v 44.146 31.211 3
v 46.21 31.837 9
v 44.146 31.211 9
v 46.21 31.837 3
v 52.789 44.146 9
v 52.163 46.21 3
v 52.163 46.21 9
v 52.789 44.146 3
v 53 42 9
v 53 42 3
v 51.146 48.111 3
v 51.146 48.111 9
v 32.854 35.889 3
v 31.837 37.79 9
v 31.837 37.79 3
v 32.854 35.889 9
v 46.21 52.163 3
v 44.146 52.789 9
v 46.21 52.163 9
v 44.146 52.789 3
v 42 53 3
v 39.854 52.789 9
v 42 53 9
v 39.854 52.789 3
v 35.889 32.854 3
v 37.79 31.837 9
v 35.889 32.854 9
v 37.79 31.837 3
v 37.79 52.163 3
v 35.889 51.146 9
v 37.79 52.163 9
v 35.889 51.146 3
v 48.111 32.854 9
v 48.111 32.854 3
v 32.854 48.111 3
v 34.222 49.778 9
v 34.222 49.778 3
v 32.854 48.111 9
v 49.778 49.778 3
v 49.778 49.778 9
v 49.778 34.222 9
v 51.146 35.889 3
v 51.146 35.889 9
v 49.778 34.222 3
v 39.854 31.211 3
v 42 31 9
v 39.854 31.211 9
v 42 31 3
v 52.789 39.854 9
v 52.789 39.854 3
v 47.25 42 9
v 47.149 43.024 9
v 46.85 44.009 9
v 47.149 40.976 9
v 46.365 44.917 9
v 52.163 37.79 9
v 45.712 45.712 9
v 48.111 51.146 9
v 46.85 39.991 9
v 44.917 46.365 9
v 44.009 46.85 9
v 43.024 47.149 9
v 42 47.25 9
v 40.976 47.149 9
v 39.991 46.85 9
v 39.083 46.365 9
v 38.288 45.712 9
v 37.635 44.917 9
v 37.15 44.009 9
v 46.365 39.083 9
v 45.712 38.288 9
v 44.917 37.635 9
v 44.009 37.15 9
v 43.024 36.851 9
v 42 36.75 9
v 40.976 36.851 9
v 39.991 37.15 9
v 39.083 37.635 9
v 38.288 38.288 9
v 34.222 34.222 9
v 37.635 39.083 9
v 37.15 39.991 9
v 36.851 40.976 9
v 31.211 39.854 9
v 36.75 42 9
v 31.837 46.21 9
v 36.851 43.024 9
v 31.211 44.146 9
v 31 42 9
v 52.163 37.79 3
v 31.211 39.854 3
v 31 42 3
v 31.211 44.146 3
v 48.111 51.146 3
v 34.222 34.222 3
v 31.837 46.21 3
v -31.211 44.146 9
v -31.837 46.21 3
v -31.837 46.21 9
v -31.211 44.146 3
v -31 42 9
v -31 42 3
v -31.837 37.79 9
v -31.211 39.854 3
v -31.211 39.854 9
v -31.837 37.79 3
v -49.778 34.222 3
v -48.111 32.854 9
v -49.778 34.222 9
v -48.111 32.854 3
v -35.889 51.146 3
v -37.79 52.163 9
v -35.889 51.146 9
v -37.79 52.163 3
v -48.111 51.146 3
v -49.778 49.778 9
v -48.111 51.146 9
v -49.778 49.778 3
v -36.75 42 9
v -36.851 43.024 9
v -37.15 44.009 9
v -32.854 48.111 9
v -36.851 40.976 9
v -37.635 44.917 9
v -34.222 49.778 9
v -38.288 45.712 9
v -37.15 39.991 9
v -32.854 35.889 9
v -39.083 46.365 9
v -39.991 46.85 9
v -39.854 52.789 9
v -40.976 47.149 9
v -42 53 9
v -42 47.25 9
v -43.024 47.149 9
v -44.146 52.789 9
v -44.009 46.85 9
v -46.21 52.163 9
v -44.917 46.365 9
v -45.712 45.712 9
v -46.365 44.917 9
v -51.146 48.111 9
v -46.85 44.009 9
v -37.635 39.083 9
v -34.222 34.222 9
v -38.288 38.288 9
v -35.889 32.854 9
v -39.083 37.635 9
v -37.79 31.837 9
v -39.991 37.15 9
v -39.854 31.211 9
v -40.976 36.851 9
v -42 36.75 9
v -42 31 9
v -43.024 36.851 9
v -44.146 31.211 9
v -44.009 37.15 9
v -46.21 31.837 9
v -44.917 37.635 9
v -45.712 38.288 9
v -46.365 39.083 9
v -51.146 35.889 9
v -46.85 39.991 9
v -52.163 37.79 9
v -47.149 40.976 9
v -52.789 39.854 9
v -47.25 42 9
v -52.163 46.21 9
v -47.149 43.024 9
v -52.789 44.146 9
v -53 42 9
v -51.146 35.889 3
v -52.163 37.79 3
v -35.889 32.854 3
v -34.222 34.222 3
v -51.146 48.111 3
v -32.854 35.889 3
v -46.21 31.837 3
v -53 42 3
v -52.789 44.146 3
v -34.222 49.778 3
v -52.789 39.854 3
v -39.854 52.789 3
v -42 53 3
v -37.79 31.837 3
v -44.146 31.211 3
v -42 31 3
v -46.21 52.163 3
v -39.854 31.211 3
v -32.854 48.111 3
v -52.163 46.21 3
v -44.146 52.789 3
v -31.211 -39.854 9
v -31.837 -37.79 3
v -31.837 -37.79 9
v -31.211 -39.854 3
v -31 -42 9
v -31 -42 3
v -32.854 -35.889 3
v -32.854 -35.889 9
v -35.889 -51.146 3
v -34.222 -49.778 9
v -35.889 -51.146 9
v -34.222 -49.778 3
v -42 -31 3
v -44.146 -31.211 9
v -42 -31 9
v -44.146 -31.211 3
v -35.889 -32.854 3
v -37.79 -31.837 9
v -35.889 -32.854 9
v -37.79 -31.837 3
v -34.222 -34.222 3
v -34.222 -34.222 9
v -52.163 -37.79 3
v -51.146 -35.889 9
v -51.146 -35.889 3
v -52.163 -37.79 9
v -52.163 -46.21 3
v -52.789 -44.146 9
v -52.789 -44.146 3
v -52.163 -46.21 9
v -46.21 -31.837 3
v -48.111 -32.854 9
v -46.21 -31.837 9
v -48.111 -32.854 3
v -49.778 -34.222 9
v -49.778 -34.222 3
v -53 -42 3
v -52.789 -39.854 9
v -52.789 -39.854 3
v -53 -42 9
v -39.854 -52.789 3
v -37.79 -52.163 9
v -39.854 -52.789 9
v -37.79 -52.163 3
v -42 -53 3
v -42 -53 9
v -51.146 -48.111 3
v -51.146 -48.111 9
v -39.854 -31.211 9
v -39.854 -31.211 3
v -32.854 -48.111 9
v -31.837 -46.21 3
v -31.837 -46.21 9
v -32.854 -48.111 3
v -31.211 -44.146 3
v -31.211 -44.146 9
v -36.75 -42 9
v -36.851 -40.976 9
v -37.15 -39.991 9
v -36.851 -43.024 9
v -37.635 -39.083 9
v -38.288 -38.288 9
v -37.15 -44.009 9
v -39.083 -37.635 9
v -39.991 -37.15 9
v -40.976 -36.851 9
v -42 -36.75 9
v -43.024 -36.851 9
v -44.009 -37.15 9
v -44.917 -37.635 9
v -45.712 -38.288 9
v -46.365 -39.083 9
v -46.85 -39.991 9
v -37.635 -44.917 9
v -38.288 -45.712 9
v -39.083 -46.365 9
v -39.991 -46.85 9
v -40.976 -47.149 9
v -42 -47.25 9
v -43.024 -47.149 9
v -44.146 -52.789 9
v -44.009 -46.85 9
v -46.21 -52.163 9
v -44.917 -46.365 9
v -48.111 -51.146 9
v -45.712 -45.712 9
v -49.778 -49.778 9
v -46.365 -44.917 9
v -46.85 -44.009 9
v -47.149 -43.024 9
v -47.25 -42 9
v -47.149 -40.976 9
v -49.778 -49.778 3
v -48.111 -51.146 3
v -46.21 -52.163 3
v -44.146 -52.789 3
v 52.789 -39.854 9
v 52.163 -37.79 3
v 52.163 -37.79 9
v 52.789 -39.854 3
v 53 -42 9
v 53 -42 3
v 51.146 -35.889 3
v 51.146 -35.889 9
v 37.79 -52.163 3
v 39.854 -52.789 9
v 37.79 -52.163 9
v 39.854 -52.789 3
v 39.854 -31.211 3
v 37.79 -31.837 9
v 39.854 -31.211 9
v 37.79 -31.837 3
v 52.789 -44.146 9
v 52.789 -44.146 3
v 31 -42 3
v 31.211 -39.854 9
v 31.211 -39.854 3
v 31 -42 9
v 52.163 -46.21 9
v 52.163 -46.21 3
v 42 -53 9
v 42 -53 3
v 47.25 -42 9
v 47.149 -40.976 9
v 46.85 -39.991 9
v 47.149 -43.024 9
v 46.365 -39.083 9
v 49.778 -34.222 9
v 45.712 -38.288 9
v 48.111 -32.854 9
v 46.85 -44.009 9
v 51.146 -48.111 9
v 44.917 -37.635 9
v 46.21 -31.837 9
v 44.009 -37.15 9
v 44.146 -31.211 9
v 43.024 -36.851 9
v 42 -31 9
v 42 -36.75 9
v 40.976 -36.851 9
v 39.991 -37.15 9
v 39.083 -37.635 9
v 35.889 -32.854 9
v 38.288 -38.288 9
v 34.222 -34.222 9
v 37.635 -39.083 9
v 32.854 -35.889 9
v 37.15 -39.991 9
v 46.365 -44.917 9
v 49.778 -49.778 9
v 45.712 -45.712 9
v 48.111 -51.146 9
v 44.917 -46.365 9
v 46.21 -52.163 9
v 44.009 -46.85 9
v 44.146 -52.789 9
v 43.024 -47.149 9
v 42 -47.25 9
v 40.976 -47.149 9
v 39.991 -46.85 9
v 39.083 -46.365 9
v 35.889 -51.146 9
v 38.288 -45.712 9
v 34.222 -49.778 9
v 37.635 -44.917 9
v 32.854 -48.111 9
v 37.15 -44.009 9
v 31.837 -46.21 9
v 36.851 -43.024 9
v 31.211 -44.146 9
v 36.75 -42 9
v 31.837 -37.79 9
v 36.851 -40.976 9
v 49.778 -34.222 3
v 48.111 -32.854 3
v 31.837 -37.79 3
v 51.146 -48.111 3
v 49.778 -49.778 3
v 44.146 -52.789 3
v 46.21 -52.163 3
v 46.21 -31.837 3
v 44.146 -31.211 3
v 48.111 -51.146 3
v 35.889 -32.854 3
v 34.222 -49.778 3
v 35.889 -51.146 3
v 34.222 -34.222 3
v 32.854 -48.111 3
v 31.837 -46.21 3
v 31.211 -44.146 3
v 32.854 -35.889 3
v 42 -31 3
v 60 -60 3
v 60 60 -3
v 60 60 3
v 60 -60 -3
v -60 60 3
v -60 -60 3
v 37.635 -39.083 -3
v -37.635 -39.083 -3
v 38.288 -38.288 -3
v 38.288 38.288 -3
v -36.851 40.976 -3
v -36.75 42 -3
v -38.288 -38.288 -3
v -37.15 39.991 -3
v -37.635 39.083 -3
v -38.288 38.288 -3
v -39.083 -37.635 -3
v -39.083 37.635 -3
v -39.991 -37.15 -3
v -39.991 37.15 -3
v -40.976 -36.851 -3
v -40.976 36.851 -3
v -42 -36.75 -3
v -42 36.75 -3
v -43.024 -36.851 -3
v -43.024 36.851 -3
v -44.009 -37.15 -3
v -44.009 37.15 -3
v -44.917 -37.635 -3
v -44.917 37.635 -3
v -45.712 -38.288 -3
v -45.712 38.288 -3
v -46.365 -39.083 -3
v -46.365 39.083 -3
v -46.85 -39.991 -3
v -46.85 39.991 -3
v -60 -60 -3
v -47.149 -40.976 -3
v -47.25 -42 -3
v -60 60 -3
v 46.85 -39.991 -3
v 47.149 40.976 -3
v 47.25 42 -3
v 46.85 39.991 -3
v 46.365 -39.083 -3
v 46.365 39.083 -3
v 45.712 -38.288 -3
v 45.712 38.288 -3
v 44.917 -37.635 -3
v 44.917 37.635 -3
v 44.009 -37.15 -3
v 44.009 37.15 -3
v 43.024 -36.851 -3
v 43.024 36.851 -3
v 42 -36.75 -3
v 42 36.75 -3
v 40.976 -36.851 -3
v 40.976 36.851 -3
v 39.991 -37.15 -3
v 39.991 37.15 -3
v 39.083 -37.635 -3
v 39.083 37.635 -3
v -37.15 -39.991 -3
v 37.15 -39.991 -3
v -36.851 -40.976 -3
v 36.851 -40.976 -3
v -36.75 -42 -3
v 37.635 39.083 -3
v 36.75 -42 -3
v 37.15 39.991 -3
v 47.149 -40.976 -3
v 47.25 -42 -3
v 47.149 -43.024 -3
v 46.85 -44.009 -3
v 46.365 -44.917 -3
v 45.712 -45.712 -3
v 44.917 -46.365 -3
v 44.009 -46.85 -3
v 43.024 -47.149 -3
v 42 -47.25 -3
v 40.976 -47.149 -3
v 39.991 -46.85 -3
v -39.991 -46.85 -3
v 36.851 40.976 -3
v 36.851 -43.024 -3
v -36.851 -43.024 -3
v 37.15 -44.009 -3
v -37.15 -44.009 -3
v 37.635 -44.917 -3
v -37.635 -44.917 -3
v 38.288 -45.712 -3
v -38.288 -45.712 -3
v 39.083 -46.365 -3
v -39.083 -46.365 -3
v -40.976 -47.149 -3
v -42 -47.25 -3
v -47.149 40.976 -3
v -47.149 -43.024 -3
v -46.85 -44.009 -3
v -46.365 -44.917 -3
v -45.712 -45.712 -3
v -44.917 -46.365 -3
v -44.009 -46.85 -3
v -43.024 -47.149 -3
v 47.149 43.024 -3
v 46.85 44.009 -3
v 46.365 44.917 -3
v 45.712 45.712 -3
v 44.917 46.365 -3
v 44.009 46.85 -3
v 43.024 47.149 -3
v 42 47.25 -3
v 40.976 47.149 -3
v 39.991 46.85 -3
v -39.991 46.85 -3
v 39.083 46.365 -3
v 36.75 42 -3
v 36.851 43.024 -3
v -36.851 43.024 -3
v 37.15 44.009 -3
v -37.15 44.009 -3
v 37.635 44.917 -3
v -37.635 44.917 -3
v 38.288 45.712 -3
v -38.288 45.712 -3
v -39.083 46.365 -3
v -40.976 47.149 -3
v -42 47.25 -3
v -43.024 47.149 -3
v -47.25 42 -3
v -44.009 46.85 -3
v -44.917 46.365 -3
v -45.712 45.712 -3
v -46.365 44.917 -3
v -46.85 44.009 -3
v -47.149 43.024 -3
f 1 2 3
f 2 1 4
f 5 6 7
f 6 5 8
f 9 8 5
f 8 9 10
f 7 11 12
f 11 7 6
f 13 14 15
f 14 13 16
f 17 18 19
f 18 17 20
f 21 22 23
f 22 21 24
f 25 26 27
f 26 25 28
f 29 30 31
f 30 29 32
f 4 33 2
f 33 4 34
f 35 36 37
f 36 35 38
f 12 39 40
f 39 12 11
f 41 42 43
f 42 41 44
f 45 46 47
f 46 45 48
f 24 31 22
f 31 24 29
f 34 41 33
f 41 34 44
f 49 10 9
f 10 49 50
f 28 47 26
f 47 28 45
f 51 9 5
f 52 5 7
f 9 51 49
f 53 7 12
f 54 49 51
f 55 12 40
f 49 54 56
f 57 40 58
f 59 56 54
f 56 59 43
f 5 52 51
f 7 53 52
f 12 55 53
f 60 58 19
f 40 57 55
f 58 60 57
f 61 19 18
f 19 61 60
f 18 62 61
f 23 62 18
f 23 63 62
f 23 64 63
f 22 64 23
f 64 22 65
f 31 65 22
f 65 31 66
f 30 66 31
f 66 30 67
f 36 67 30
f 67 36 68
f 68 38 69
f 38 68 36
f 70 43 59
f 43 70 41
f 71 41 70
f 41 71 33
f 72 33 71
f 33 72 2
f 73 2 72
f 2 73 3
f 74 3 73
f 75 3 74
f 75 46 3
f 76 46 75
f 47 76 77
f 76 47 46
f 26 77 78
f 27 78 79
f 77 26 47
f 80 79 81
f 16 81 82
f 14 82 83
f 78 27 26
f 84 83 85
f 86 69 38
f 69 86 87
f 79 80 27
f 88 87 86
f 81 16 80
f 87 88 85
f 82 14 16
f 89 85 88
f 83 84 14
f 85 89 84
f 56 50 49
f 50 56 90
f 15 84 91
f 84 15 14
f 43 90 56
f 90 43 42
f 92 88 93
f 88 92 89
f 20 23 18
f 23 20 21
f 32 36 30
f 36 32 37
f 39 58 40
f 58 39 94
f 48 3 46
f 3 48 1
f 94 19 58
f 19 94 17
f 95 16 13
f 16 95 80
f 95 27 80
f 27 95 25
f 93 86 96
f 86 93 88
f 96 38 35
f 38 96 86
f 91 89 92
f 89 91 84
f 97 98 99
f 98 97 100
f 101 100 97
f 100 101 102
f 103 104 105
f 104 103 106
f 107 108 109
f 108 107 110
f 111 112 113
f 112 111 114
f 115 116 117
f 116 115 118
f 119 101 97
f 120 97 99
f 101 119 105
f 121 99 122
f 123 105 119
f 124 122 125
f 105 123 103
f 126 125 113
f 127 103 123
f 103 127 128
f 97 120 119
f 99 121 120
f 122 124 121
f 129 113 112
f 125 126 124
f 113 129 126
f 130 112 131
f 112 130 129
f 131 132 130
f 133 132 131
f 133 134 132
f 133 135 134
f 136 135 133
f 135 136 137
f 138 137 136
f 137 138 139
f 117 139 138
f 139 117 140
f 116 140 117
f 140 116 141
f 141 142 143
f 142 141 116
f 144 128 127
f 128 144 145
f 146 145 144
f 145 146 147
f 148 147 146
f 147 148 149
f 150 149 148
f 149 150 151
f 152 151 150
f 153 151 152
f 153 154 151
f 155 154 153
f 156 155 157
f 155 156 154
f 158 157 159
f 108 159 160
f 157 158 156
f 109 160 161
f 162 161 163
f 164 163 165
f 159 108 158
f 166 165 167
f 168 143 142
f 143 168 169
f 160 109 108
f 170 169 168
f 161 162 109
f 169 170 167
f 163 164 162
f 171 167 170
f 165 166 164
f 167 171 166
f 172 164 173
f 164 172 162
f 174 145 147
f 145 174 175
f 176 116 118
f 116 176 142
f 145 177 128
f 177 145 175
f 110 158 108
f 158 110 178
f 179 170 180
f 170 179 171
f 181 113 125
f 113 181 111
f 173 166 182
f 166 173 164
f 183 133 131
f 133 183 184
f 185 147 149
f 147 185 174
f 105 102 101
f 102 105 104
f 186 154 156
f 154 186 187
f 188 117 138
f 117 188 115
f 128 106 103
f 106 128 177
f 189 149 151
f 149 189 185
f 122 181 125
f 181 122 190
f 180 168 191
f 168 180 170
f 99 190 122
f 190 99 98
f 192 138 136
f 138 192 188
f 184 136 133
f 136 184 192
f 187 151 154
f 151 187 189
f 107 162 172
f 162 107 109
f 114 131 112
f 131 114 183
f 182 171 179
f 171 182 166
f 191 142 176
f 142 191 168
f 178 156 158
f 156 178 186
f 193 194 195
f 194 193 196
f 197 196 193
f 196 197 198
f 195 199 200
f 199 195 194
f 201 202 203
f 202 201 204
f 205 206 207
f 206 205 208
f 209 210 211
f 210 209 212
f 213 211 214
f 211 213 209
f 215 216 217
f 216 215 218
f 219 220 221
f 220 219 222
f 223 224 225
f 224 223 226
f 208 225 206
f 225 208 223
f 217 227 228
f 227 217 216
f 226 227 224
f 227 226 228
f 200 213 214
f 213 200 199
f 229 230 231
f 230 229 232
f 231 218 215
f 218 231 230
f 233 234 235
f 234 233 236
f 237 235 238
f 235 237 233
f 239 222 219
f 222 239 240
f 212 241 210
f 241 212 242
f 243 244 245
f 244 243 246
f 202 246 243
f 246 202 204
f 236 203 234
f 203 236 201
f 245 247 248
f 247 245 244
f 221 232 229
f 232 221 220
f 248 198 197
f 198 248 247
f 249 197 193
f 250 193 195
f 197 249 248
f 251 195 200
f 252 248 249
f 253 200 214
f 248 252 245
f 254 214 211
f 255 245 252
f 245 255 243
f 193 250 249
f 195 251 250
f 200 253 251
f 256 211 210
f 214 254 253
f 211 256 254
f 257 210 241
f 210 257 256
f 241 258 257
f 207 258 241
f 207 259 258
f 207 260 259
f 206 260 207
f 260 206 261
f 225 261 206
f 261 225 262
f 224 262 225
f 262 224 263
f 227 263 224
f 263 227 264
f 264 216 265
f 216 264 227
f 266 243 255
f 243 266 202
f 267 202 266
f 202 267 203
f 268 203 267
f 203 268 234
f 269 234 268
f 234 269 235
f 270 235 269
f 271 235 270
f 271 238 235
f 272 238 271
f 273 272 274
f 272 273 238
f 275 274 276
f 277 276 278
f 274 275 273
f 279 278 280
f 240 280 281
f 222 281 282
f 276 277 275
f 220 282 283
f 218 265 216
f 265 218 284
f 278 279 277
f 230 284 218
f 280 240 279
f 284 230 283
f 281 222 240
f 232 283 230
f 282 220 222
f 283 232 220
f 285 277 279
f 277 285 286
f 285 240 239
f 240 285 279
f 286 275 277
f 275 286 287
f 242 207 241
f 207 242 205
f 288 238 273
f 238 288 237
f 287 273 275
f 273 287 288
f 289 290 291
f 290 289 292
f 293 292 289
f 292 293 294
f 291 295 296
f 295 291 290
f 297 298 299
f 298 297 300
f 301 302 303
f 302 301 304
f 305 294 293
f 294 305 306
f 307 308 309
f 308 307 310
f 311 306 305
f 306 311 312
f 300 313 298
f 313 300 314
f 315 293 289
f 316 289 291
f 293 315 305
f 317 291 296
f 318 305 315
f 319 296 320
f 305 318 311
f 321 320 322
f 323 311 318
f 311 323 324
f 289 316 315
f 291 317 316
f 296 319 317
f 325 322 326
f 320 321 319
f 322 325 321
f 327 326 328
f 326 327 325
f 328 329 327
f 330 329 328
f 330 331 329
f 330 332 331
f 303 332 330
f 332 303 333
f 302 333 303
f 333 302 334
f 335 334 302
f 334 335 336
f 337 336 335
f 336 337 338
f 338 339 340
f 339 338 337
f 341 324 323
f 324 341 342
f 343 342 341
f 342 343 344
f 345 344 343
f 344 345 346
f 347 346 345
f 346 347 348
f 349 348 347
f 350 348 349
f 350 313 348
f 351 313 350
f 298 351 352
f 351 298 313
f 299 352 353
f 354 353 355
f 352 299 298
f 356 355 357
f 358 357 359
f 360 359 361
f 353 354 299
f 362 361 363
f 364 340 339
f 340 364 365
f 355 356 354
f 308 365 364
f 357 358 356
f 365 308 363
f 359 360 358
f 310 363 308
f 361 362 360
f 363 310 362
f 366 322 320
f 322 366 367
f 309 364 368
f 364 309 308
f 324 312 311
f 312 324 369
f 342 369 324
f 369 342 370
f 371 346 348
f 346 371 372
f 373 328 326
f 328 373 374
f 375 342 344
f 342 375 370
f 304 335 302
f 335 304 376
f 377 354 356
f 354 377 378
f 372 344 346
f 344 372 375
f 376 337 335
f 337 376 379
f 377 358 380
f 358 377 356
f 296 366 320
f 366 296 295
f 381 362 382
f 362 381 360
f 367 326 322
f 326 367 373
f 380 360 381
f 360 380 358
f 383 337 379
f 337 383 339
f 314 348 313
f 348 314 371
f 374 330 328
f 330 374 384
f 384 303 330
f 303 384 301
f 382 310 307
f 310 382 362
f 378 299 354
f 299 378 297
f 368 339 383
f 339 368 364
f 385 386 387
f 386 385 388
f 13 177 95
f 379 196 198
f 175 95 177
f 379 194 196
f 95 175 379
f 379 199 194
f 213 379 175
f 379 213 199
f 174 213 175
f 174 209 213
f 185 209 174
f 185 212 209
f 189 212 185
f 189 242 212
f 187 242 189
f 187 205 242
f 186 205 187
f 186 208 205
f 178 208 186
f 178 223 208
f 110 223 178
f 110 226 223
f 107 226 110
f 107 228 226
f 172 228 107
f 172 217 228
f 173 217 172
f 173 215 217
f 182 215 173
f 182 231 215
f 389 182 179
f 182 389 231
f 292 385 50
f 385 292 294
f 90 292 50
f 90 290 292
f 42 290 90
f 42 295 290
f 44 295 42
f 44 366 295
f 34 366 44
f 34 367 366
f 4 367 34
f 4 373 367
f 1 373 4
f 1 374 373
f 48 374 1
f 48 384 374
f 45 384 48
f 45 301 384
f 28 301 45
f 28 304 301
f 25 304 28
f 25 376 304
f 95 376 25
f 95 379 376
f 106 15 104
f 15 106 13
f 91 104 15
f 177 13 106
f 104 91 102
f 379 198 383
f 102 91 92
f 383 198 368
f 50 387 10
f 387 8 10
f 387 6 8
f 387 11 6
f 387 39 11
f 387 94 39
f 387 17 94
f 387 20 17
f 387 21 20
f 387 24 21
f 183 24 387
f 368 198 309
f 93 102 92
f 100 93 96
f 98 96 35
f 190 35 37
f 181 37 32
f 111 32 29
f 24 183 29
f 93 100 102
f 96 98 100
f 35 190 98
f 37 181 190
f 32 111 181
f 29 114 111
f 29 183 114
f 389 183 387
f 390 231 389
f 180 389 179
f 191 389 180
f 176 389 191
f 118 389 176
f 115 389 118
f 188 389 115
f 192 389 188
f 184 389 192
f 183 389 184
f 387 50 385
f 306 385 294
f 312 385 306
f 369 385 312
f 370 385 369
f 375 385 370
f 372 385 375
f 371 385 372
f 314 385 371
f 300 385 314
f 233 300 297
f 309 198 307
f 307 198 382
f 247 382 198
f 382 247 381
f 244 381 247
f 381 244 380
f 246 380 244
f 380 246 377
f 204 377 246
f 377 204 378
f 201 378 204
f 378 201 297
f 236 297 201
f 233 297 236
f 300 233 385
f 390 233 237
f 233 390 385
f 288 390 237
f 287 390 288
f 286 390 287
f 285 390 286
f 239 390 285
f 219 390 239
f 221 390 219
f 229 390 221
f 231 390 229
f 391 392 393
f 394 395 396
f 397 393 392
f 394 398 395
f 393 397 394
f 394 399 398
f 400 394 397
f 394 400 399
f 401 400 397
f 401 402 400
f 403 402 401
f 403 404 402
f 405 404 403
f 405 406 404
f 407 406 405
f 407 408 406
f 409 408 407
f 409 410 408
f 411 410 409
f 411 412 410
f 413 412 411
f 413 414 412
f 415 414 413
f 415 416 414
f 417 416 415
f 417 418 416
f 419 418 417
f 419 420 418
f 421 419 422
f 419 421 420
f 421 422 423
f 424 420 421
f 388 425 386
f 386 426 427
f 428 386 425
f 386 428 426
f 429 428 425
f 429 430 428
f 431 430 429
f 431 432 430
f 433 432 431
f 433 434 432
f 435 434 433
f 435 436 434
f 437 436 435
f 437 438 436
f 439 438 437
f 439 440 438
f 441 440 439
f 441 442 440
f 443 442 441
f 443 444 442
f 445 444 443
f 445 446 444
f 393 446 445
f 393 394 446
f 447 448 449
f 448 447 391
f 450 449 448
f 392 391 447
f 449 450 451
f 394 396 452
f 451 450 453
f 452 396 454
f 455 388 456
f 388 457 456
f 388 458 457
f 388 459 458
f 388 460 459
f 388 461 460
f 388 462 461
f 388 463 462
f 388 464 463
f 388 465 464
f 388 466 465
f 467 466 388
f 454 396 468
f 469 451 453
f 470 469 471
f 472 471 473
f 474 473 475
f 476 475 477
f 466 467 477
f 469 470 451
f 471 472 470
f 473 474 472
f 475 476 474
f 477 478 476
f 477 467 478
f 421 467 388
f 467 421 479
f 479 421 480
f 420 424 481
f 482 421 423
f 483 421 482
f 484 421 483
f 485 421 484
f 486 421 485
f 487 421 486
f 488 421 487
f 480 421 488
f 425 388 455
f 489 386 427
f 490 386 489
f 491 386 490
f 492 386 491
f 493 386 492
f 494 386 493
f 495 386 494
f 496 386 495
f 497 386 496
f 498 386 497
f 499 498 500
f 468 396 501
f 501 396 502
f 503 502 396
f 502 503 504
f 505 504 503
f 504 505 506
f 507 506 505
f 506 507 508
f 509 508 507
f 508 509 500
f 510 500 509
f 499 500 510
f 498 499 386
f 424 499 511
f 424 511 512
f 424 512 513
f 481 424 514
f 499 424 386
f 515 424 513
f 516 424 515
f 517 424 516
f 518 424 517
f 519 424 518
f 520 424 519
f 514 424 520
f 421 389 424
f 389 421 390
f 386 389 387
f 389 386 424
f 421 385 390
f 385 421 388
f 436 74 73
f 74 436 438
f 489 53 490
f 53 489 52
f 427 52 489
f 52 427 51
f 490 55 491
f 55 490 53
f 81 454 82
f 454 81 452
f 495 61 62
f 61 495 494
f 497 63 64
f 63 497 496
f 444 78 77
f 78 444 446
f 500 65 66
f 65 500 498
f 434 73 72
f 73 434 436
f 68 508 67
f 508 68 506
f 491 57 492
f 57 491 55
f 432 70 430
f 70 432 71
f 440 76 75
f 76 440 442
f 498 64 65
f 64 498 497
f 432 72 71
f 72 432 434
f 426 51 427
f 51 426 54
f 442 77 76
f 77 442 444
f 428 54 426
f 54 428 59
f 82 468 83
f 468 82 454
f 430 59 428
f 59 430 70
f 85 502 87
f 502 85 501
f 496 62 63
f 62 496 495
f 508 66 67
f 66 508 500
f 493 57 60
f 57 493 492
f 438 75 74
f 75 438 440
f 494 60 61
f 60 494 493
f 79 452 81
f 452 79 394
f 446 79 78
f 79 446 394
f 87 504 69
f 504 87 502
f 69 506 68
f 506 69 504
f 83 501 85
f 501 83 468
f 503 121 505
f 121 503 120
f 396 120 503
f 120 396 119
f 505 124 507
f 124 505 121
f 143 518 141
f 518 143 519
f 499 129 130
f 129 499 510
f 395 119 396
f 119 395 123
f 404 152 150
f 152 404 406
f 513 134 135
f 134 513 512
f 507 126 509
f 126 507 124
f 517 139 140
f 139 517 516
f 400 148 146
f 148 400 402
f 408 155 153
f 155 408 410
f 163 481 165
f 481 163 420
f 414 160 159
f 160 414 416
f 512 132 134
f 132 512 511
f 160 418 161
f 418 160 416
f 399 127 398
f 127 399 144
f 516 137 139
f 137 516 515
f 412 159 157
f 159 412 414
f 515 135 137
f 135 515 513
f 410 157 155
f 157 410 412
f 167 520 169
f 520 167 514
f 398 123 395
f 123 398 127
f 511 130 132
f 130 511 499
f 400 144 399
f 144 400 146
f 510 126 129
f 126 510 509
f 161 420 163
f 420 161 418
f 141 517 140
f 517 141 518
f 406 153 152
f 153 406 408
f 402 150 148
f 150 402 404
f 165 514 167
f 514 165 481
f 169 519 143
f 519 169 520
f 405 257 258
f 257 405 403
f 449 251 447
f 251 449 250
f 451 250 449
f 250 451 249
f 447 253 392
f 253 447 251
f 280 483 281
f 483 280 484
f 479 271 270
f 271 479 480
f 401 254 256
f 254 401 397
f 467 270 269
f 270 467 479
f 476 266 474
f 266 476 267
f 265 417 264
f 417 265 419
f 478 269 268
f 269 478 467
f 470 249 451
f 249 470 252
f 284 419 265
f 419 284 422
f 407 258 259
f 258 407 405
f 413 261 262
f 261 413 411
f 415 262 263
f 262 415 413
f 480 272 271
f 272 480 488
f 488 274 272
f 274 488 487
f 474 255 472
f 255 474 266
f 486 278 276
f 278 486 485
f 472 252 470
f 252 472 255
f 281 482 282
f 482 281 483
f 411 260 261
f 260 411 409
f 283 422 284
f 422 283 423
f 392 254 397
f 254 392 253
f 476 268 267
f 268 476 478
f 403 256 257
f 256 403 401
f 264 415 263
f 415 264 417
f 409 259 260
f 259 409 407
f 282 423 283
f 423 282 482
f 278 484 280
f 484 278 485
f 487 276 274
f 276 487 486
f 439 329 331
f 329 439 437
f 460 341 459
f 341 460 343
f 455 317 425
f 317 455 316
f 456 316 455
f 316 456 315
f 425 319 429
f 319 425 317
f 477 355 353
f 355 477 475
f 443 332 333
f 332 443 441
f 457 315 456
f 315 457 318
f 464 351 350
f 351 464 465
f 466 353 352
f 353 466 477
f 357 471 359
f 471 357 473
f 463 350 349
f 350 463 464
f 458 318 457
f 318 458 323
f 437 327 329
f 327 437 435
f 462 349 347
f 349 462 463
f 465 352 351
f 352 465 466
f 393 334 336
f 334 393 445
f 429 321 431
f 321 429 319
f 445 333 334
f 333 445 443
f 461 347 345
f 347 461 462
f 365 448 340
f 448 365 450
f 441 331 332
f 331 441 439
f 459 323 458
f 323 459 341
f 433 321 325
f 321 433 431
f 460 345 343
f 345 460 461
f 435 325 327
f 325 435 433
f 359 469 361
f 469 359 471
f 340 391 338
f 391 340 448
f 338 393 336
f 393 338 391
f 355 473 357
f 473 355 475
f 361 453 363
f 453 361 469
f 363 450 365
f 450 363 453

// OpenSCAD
$fn = 32;

// ----------------------------------------------------------------------
// Anchor pads 120 x 120 x 12
// four corner bosses with anchor holes
// ----------------------------------------------------------------------

// --- parameters (mm) ---
plate = [120, 120, 6];  // base plate size (x, y, z)
pads = 4;               // boss count, one per corner
edge = 18;              // boss centre offset from the plate edge
boss_d = 22;            // boss diameter
boss_h = 6;             // boss height above the base plate
hole_d = 10.5;          // hole diameter

// --- derived feature positions (mm) ---
height = plate[2] + boss_h;      // = 12   overall height of the part
corner_x = plate[0] / 2 - edge;  // = 42   boss centre X
corner_y = plate[1] / 2 - edge;  // = 42   boss centre Y
feature_centers = [
  [corner_x, corner_y],
  [-corner_x, corner_y],
  [-corner_x, -corner_y],
  [corner_x, -corner_y]
];   // boss centres, anchor holes are drilled there

// base plate, four bosses standing on it, anchor holes all the way through
difference() {
  union() {
    cube(plate, center = true);
    for (centre = feature_centers)
      translate([centre[0], centre[1], plate[2] / 2 - 1])
        cylinder(d = boss_d, h = boss_h + 1);
  }
  for (centre = feature_centers)
    translate([centre[0], centre[1], -height])
      cylinder(d = hole_d, h = 2 * height + 2);  // through boss and plate
}
